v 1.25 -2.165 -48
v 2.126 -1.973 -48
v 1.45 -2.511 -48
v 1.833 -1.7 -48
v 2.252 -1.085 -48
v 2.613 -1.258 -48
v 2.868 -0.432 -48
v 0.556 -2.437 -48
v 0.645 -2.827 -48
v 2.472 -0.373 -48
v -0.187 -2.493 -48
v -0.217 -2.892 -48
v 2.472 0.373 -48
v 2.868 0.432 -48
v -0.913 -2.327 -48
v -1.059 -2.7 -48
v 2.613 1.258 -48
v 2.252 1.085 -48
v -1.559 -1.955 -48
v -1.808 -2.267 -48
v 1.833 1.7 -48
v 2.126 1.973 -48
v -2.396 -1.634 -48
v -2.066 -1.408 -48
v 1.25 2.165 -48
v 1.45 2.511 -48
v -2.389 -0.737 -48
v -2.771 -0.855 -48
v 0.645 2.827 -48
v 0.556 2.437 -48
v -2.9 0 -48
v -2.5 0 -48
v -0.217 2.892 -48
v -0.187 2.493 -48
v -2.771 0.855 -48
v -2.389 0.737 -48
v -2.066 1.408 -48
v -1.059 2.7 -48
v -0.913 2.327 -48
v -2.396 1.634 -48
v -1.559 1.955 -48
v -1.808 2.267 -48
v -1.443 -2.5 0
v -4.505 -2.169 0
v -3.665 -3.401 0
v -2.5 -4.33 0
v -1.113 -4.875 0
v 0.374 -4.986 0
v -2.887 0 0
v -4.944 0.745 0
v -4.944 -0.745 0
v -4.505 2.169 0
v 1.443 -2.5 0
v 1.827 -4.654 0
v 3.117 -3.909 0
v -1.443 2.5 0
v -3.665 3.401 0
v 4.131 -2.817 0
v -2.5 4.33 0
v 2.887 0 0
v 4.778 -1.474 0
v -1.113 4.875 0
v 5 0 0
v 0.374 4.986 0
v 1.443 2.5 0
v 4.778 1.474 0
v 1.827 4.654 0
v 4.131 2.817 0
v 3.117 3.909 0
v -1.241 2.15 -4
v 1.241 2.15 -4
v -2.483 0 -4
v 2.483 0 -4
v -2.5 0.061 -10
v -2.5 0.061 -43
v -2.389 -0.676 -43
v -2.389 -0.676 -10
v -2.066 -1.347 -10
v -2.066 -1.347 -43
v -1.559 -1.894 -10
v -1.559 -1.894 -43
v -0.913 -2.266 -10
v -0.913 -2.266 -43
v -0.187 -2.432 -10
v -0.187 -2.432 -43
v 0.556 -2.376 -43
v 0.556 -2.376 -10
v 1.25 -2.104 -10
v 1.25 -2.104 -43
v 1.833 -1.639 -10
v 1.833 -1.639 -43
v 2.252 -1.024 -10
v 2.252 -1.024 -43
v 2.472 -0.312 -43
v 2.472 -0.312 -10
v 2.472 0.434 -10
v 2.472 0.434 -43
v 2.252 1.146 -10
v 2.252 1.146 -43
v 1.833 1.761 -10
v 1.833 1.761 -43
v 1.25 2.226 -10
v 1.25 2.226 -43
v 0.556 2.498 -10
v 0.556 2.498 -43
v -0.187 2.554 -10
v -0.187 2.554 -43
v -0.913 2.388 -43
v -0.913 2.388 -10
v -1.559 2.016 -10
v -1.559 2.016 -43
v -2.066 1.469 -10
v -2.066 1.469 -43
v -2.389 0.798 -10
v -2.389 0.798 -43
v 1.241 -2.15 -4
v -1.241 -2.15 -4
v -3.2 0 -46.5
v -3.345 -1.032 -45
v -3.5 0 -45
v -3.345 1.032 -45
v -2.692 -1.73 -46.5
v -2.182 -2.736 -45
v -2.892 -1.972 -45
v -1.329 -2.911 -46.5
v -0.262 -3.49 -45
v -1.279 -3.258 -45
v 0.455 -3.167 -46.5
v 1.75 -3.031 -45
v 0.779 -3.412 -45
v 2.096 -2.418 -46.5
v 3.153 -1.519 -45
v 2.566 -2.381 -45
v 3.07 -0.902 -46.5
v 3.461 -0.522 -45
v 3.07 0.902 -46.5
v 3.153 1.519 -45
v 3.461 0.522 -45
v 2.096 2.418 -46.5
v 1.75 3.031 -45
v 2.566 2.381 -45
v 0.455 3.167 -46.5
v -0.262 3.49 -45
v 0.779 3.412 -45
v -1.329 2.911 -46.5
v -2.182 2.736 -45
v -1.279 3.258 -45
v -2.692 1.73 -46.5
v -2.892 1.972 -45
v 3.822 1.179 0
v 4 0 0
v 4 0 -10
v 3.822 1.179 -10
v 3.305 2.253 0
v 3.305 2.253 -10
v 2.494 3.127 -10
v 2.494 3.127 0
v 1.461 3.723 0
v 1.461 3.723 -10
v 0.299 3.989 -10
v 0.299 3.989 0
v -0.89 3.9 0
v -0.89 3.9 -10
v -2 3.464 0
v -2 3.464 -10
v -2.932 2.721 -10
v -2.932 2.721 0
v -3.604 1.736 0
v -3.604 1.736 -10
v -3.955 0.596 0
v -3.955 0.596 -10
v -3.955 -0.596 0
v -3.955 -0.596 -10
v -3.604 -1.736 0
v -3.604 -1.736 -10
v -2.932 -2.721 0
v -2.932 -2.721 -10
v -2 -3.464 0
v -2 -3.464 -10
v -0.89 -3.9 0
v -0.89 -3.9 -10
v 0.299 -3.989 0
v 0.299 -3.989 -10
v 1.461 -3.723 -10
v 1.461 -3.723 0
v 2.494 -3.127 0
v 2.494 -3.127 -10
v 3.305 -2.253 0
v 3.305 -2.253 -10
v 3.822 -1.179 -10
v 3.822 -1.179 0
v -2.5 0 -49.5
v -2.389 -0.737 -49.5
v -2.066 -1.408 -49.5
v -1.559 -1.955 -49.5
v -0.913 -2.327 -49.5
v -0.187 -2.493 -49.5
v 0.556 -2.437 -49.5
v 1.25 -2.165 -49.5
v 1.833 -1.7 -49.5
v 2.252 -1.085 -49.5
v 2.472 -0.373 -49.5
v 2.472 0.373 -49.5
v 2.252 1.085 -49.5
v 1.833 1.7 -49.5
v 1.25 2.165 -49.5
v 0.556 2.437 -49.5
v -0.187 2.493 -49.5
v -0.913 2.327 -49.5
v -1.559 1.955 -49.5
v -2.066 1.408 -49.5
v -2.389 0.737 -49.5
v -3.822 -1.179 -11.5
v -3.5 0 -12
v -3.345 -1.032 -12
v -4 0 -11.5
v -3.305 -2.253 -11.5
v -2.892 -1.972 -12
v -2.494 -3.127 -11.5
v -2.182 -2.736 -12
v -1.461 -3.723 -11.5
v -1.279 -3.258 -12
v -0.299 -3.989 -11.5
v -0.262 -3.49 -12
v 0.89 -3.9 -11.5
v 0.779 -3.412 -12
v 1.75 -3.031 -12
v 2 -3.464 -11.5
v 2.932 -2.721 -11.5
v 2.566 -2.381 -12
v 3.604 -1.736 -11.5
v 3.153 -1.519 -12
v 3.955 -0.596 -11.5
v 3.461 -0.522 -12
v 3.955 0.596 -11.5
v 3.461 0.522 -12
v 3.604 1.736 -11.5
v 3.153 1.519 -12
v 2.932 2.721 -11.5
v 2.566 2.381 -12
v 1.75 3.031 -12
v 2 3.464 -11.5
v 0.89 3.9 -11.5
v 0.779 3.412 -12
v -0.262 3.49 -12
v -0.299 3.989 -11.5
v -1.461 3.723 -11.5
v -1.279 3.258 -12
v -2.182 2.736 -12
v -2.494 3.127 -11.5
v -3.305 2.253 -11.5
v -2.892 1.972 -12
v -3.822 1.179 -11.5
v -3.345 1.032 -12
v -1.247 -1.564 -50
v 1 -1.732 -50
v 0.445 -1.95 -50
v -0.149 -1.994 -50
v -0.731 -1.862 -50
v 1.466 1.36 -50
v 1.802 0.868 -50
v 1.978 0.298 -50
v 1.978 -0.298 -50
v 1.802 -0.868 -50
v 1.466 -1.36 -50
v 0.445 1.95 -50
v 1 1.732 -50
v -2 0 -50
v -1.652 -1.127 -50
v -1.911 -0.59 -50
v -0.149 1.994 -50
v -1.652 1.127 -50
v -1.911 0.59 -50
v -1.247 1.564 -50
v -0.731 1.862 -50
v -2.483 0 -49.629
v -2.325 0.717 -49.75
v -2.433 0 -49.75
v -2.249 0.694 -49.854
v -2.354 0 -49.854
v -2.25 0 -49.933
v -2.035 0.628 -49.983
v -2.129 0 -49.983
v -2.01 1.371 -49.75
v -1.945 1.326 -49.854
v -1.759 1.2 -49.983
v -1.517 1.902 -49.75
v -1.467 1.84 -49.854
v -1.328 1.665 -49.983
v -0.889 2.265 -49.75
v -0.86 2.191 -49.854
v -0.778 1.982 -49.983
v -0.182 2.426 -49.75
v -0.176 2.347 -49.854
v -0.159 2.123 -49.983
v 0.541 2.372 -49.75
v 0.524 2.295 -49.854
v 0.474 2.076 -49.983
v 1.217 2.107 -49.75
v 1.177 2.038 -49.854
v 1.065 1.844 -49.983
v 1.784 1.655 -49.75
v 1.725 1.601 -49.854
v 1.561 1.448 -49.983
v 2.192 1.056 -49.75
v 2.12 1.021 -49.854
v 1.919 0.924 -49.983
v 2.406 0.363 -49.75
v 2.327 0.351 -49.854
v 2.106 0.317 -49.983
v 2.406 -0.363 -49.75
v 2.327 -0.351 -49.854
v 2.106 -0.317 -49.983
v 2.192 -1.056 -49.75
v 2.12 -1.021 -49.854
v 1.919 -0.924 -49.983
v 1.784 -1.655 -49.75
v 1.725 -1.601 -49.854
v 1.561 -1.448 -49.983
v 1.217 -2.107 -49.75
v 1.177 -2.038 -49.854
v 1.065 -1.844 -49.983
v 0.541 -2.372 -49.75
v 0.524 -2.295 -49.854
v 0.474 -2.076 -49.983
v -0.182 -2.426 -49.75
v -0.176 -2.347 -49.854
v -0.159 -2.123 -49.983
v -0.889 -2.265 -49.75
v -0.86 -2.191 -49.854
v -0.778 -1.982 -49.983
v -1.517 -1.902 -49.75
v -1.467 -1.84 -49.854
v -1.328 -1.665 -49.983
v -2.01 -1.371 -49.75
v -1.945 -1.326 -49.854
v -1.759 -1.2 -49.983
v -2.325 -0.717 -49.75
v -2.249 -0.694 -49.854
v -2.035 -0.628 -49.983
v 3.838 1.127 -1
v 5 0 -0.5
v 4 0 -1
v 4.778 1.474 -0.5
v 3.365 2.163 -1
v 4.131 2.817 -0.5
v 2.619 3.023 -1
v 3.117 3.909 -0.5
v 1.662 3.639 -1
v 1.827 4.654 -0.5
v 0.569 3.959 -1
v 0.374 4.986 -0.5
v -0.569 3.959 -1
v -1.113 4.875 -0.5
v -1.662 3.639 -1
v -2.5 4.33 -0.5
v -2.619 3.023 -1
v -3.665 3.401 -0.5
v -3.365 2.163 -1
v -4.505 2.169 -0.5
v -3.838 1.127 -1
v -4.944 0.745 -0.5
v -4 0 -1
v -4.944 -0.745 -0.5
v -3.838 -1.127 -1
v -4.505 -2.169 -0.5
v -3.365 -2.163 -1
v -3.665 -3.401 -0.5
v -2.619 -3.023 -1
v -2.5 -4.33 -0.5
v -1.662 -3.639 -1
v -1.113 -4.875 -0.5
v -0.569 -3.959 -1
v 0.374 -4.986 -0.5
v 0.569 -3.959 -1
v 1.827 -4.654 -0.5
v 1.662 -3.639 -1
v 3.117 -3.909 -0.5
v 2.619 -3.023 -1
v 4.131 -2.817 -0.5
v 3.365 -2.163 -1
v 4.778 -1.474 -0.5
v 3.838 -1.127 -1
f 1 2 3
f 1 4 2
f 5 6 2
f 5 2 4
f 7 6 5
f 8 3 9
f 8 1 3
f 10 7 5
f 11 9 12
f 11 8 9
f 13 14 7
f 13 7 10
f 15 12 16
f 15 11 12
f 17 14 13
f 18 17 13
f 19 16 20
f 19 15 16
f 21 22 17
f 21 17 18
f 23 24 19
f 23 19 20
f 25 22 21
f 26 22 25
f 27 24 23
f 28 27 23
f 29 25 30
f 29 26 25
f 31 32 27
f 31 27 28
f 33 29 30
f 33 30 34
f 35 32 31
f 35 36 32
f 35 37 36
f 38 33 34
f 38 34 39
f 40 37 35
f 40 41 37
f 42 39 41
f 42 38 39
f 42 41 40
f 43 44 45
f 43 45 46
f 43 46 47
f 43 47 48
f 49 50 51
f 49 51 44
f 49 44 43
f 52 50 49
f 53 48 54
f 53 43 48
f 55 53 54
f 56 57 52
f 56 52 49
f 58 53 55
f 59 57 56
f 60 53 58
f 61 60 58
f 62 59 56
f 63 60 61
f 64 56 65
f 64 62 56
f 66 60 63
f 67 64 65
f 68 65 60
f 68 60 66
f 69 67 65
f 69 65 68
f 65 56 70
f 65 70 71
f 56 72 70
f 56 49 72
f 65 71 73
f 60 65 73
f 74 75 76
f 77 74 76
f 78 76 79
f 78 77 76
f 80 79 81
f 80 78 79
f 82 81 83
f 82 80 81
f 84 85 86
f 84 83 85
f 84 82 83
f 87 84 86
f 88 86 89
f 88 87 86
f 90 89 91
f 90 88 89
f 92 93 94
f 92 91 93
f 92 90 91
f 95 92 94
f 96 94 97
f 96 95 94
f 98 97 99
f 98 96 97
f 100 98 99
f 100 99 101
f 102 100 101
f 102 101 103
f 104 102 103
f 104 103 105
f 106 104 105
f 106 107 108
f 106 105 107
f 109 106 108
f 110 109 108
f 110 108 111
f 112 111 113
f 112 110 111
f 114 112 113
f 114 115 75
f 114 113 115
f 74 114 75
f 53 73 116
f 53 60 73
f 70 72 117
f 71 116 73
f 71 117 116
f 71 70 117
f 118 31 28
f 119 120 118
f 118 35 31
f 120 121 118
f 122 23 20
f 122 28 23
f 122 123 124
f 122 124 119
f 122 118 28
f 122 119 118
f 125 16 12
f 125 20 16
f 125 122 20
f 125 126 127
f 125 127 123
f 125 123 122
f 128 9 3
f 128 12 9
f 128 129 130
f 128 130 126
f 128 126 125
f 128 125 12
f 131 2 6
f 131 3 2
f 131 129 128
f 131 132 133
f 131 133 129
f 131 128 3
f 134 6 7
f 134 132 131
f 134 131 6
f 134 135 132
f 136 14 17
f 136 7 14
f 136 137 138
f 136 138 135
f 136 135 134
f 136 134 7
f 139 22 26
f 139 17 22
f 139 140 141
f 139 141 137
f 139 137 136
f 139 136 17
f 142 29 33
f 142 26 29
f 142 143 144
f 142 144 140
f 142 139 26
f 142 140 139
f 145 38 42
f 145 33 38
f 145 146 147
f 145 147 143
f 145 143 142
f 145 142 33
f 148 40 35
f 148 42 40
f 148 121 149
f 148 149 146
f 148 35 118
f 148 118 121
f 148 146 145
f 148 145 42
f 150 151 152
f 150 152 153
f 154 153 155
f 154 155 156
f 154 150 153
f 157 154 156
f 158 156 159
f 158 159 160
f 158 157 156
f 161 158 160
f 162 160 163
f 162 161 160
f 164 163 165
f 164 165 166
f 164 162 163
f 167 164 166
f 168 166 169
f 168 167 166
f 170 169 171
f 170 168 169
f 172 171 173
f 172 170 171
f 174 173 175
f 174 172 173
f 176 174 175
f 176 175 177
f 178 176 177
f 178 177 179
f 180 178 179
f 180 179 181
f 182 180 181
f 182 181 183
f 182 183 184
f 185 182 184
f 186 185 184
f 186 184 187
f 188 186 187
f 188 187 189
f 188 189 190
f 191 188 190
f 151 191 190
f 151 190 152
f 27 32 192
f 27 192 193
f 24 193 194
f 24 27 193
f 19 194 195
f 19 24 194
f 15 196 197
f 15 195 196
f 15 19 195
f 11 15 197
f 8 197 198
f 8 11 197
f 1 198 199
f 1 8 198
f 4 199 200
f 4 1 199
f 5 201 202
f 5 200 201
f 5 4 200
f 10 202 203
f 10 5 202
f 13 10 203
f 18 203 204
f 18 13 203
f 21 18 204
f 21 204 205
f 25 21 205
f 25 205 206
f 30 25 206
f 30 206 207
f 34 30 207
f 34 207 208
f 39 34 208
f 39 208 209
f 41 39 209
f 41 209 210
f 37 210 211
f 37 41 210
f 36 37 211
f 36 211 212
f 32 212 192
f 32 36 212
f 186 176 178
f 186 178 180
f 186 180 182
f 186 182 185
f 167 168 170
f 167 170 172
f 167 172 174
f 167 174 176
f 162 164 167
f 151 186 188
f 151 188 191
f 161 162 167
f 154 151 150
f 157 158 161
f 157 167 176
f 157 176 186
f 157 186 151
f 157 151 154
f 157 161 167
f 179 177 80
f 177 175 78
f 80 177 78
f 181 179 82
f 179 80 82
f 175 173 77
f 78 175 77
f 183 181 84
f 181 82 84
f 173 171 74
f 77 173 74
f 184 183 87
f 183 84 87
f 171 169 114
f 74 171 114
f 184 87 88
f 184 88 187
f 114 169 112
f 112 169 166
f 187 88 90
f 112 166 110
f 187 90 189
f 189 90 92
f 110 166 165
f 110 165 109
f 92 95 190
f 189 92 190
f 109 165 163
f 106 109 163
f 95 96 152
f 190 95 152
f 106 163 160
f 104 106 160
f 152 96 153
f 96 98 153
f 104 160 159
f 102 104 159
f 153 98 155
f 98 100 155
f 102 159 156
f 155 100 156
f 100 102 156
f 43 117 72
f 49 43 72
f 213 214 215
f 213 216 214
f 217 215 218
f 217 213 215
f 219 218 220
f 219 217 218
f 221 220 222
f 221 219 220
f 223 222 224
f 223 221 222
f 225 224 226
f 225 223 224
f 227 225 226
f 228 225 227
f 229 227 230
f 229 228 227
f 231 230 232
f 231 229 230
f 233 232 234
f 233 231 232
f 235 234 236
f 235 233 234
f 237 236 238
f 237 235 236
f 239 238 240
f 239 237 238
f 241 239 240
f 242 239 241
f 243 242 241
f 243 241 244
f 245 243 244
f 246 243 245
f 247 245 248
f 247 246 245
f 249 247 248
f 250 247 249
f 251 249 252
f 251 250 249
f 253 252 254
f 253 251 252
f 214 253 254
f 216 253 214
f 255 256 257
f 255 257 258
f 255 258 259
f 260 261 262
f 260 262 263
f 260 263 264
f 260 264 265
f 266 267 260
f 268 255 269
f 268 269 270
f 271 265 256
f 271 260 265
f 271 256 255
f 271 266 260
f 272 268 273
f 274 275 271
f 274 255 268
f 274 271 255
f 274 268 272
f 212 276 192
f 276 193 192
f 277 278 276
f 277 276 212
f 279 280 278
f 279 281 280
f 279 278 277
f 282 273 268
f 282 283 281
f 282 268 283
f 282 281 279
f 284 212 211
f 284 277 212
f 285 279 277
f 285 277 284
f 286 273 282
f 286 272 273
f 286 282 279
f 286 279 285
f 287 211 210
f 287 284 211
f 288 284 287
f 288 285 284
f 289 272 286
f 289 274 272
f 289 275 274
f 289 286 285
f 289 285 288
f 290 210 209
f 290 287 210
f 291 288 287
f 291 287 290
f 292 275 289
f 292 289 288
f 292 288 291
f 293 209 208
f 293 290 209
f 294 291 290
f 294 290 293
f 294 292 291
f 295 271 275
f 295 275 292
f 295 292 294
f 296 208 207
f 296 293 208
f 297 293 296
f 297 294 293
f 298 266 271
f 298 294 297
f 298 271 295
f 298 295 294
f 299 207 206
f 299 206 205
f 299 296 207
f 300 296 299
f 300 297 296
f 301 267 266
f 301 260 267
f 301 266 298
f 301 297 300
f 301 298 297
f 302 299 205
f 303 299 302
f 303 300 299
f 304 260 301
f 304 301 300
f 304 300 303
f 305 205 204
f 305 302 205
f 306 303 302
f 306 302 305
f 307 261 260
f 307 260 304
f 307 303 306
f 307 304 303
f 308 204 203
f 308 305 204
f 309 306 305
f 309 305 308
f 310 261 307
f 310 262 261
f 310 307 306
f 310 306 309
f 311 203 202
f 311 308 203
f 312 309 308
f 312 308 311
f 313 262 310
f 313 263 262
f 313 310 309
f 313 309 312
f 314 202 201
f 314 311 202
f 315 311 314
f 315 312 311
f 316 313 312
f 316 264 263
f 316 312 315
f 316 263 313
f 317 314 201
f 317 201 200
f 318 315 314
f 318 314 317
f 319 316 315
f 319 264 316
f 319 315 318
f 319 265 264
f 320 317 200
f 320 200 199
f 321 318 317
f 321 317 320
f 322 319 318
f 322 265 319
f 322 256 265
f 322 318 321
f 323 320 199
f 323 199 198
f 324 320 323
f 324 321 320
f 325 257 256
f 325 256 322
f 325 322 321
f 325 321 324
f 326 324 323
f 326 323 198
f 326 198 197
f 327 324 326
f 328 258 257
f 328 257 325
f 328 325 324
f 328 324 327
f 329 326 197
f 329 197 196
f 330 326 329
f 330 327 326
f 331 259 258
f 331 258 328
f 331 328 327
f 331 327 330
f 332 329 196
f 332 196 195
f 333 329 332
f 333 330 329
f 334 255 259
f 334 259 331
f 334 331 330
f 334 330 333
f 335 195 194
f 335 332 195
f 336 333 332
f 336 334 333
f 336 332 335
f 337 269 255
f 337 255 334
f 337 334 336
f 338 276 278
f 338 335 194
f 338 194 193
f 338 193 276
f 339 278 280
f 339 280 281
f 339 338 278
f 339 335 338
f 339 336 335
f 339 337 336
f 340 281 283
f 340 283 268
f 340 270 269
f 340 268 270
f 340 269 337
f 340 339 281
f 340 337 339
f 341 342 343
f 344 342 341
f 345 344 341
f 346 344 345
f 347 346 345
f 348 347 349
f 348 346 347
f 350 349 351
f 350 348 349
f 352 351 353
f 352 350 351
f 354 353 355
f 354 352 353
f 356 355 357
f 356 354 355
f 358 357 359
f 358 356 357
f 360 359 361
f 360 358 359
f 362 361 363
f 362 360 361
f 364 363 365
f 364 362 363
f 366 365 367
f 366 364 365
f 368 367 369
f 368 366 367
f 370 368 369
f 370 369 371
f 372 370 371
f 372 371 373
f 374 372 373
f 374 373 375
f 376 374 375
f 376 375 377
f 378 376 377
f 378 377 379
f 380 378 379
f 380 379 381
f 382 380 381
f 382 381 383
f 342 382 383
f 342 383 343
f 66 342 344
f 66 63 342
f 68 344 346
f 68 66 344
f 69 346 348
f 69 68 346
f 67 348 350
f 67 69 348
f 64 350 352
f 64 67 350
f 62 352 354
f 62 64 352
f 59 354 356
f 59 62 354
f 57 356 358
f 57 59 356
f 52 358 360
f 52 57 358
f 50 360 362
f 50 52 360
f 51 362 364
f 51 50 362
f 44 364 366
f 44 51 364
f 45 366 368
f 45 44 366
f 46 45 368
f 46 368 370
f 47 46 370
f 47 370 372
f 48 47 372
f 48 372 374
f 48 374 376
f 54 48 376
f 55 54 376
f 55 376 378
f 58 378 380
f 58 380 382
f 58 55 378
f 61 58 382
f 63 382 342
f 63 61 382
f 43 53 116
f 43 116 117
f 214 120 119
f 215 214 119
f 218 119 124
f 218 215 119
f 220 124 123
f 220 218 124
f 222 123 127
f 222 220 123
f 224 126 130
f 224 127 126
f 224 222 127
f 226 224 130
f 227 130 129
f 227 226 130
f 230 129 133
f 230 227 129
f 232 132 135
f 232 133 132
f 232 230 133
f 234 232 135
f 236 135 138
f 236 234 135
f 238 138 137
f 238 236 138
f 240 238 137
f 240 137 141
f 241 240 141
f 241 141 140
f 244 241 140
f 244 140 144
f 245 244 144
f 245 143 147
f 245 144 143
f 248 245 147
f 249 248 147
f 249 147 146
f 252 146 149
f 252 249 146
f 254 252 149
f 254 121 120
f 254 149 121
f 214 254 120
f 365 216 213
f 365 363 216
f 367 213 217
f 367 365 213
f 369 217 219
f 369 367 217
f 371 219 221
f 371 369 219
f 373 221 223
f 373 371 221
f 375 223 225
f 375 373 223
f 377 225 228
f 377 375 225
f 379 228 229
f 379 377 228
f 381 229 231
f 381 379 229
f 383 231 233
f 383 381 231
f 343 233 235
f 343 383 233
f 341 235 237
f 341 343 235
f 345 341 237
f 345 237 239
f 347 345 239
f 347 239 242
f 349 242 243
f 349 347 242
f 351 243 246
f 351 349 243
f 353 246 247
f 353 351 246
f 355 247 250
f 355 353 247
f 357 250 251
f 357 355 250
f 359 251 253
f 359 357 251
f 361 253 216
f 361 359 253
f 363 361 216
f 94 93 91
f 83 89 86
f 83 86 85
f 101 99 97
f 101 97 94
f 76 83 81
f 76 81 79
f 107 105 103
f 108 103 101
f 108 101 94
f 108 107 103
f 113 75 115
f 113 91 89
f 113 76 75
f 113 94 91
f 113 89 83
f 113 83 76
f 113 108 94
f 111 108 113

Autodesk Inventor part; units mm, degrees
ref_plane "YZ Plane" through (0, 0, 0) normal (1, 0, 0) x (0, 1, 0)
ref_plane "XZ Plane" through (0, 0, 0) normal (0, 1, 0) x (-1, 0, 0)
ref_plane "XY Plane" through (0, 0, 0) normal (0, 0, 1) x (1, 0, 0)
sketch "Sketch1" plane through (0, 0, 0) normal (0, 0, 1) x (1, 0, 0)
  circle A0 centre (0, 0) radius 5
  dimension "d0" = 10
extrude "Extrusion1" add sketch "Sketch1" against normal blind 1
chamfer "Chamfer1" distance 1 distance2 0.5 1 edges at (-5, 0, -1) measured on face at (-0.591, 1.5584, -1)
sketch "Sketch2" plane through (0, 0, -1) normal (0, 0, -1) x (-1, 0, 0)
  circle A0 centre (0, 0) radius 4 projected
extrude "Extrusion2" add sketch "Sketch2" along normal blind 11
chamfer "Chamfer2" distance 0.5 angle 45 1 edges at (4, 0, -12)
sketch "Sketch3" plane through (0, 0, -12) normal (0, 0, -1) x (-1, 0, 0)
  circle A0 centre (0, 0) radius 3.5 projected
extrude "Extrusion3" add sketch "Sketch3" along normal blind 33
sketch "Sketch4" plane through (0, 0, -45) normal (0, 0, -1) x (-1, 0, 0)
  circle A0 centre (0, 0) radius 3.5 projected
extrude "Extrusion4" add sketch "Sketch4" along normal blind 3
chamfer "Chamfer3" distance 0.6 distance2 3 1 edges at (3.5, 0, -48) measured on face at (0.4137, 0.4564, -48)
sketch "Sketch5" plane through (0, 0, -48) normal (0, 0, -1) x (-1, 0, 0)
  circle A0 centre (0, 0) radius 2.9 projected
  circle A1 centre (0, 0) radius 2.5
  dimension "d18" = 0.4
extrude "Extrusion5" add sketch "Sketch5" along normal blind 2 contours A1
fillet "Fillet1" radius 0.5 1 edges at (2.5, 0, -50)
sketch "Sketch6" plane through (0, 0, 0) normal (0, 0, 1) x (1, 0, 0)
  line L0 (1.4434, 2.5) -> (2.8868, 0)
  line L1 (2.8868, 0) -> (1.4434, -2.5)
  line L2 (1.4434, -2.5) -> (-1.4434, -2.5)
  line L3 (-1.4434, -2.5) -> (-2.8868, 0)
  line L4 (-2.8868, 0) -> (-1.4434, 2.5)
  line L5 (-1.4434, 2.5) -> (1.4434, 2.5)
  point P0 (0, 0)
  point P1 (0, 0)
  dimension "d22" = 5
extrude "Extrusion6" cut sketch "Sketch6" against normal blind 4 draft -5
sketch "Sketch7" plane through (0, 0, 0) normal (0, 0, 1) x (1, 0, 0)
  circle A0 centre (0, 0) radius 4 projected
extrude "Extrusion7" add sketch "Sketch7" against normal blind 10 separate body
sketch "Sketch8" plane through (0, 0, -10) normal (0, 0, -1) x (-1, 0, 0)
  circle A0 centre (0, 0.061) radius 2.5
  point P0 (0, 0)
  dimension "d27" = 5
extrude "Extrusion8" add sketch "Sketch8" along normal blind 33 bodies 2
thread "Thread1" size "M7x1" class "6g" standard "ISO Metric profile" full length
equation "\"d25\" = Nestled_Board_Thickness"
equation "\"Nestled_Board_Thickness\" = 10"
properties part number "Confirmat L50 NB T12"
